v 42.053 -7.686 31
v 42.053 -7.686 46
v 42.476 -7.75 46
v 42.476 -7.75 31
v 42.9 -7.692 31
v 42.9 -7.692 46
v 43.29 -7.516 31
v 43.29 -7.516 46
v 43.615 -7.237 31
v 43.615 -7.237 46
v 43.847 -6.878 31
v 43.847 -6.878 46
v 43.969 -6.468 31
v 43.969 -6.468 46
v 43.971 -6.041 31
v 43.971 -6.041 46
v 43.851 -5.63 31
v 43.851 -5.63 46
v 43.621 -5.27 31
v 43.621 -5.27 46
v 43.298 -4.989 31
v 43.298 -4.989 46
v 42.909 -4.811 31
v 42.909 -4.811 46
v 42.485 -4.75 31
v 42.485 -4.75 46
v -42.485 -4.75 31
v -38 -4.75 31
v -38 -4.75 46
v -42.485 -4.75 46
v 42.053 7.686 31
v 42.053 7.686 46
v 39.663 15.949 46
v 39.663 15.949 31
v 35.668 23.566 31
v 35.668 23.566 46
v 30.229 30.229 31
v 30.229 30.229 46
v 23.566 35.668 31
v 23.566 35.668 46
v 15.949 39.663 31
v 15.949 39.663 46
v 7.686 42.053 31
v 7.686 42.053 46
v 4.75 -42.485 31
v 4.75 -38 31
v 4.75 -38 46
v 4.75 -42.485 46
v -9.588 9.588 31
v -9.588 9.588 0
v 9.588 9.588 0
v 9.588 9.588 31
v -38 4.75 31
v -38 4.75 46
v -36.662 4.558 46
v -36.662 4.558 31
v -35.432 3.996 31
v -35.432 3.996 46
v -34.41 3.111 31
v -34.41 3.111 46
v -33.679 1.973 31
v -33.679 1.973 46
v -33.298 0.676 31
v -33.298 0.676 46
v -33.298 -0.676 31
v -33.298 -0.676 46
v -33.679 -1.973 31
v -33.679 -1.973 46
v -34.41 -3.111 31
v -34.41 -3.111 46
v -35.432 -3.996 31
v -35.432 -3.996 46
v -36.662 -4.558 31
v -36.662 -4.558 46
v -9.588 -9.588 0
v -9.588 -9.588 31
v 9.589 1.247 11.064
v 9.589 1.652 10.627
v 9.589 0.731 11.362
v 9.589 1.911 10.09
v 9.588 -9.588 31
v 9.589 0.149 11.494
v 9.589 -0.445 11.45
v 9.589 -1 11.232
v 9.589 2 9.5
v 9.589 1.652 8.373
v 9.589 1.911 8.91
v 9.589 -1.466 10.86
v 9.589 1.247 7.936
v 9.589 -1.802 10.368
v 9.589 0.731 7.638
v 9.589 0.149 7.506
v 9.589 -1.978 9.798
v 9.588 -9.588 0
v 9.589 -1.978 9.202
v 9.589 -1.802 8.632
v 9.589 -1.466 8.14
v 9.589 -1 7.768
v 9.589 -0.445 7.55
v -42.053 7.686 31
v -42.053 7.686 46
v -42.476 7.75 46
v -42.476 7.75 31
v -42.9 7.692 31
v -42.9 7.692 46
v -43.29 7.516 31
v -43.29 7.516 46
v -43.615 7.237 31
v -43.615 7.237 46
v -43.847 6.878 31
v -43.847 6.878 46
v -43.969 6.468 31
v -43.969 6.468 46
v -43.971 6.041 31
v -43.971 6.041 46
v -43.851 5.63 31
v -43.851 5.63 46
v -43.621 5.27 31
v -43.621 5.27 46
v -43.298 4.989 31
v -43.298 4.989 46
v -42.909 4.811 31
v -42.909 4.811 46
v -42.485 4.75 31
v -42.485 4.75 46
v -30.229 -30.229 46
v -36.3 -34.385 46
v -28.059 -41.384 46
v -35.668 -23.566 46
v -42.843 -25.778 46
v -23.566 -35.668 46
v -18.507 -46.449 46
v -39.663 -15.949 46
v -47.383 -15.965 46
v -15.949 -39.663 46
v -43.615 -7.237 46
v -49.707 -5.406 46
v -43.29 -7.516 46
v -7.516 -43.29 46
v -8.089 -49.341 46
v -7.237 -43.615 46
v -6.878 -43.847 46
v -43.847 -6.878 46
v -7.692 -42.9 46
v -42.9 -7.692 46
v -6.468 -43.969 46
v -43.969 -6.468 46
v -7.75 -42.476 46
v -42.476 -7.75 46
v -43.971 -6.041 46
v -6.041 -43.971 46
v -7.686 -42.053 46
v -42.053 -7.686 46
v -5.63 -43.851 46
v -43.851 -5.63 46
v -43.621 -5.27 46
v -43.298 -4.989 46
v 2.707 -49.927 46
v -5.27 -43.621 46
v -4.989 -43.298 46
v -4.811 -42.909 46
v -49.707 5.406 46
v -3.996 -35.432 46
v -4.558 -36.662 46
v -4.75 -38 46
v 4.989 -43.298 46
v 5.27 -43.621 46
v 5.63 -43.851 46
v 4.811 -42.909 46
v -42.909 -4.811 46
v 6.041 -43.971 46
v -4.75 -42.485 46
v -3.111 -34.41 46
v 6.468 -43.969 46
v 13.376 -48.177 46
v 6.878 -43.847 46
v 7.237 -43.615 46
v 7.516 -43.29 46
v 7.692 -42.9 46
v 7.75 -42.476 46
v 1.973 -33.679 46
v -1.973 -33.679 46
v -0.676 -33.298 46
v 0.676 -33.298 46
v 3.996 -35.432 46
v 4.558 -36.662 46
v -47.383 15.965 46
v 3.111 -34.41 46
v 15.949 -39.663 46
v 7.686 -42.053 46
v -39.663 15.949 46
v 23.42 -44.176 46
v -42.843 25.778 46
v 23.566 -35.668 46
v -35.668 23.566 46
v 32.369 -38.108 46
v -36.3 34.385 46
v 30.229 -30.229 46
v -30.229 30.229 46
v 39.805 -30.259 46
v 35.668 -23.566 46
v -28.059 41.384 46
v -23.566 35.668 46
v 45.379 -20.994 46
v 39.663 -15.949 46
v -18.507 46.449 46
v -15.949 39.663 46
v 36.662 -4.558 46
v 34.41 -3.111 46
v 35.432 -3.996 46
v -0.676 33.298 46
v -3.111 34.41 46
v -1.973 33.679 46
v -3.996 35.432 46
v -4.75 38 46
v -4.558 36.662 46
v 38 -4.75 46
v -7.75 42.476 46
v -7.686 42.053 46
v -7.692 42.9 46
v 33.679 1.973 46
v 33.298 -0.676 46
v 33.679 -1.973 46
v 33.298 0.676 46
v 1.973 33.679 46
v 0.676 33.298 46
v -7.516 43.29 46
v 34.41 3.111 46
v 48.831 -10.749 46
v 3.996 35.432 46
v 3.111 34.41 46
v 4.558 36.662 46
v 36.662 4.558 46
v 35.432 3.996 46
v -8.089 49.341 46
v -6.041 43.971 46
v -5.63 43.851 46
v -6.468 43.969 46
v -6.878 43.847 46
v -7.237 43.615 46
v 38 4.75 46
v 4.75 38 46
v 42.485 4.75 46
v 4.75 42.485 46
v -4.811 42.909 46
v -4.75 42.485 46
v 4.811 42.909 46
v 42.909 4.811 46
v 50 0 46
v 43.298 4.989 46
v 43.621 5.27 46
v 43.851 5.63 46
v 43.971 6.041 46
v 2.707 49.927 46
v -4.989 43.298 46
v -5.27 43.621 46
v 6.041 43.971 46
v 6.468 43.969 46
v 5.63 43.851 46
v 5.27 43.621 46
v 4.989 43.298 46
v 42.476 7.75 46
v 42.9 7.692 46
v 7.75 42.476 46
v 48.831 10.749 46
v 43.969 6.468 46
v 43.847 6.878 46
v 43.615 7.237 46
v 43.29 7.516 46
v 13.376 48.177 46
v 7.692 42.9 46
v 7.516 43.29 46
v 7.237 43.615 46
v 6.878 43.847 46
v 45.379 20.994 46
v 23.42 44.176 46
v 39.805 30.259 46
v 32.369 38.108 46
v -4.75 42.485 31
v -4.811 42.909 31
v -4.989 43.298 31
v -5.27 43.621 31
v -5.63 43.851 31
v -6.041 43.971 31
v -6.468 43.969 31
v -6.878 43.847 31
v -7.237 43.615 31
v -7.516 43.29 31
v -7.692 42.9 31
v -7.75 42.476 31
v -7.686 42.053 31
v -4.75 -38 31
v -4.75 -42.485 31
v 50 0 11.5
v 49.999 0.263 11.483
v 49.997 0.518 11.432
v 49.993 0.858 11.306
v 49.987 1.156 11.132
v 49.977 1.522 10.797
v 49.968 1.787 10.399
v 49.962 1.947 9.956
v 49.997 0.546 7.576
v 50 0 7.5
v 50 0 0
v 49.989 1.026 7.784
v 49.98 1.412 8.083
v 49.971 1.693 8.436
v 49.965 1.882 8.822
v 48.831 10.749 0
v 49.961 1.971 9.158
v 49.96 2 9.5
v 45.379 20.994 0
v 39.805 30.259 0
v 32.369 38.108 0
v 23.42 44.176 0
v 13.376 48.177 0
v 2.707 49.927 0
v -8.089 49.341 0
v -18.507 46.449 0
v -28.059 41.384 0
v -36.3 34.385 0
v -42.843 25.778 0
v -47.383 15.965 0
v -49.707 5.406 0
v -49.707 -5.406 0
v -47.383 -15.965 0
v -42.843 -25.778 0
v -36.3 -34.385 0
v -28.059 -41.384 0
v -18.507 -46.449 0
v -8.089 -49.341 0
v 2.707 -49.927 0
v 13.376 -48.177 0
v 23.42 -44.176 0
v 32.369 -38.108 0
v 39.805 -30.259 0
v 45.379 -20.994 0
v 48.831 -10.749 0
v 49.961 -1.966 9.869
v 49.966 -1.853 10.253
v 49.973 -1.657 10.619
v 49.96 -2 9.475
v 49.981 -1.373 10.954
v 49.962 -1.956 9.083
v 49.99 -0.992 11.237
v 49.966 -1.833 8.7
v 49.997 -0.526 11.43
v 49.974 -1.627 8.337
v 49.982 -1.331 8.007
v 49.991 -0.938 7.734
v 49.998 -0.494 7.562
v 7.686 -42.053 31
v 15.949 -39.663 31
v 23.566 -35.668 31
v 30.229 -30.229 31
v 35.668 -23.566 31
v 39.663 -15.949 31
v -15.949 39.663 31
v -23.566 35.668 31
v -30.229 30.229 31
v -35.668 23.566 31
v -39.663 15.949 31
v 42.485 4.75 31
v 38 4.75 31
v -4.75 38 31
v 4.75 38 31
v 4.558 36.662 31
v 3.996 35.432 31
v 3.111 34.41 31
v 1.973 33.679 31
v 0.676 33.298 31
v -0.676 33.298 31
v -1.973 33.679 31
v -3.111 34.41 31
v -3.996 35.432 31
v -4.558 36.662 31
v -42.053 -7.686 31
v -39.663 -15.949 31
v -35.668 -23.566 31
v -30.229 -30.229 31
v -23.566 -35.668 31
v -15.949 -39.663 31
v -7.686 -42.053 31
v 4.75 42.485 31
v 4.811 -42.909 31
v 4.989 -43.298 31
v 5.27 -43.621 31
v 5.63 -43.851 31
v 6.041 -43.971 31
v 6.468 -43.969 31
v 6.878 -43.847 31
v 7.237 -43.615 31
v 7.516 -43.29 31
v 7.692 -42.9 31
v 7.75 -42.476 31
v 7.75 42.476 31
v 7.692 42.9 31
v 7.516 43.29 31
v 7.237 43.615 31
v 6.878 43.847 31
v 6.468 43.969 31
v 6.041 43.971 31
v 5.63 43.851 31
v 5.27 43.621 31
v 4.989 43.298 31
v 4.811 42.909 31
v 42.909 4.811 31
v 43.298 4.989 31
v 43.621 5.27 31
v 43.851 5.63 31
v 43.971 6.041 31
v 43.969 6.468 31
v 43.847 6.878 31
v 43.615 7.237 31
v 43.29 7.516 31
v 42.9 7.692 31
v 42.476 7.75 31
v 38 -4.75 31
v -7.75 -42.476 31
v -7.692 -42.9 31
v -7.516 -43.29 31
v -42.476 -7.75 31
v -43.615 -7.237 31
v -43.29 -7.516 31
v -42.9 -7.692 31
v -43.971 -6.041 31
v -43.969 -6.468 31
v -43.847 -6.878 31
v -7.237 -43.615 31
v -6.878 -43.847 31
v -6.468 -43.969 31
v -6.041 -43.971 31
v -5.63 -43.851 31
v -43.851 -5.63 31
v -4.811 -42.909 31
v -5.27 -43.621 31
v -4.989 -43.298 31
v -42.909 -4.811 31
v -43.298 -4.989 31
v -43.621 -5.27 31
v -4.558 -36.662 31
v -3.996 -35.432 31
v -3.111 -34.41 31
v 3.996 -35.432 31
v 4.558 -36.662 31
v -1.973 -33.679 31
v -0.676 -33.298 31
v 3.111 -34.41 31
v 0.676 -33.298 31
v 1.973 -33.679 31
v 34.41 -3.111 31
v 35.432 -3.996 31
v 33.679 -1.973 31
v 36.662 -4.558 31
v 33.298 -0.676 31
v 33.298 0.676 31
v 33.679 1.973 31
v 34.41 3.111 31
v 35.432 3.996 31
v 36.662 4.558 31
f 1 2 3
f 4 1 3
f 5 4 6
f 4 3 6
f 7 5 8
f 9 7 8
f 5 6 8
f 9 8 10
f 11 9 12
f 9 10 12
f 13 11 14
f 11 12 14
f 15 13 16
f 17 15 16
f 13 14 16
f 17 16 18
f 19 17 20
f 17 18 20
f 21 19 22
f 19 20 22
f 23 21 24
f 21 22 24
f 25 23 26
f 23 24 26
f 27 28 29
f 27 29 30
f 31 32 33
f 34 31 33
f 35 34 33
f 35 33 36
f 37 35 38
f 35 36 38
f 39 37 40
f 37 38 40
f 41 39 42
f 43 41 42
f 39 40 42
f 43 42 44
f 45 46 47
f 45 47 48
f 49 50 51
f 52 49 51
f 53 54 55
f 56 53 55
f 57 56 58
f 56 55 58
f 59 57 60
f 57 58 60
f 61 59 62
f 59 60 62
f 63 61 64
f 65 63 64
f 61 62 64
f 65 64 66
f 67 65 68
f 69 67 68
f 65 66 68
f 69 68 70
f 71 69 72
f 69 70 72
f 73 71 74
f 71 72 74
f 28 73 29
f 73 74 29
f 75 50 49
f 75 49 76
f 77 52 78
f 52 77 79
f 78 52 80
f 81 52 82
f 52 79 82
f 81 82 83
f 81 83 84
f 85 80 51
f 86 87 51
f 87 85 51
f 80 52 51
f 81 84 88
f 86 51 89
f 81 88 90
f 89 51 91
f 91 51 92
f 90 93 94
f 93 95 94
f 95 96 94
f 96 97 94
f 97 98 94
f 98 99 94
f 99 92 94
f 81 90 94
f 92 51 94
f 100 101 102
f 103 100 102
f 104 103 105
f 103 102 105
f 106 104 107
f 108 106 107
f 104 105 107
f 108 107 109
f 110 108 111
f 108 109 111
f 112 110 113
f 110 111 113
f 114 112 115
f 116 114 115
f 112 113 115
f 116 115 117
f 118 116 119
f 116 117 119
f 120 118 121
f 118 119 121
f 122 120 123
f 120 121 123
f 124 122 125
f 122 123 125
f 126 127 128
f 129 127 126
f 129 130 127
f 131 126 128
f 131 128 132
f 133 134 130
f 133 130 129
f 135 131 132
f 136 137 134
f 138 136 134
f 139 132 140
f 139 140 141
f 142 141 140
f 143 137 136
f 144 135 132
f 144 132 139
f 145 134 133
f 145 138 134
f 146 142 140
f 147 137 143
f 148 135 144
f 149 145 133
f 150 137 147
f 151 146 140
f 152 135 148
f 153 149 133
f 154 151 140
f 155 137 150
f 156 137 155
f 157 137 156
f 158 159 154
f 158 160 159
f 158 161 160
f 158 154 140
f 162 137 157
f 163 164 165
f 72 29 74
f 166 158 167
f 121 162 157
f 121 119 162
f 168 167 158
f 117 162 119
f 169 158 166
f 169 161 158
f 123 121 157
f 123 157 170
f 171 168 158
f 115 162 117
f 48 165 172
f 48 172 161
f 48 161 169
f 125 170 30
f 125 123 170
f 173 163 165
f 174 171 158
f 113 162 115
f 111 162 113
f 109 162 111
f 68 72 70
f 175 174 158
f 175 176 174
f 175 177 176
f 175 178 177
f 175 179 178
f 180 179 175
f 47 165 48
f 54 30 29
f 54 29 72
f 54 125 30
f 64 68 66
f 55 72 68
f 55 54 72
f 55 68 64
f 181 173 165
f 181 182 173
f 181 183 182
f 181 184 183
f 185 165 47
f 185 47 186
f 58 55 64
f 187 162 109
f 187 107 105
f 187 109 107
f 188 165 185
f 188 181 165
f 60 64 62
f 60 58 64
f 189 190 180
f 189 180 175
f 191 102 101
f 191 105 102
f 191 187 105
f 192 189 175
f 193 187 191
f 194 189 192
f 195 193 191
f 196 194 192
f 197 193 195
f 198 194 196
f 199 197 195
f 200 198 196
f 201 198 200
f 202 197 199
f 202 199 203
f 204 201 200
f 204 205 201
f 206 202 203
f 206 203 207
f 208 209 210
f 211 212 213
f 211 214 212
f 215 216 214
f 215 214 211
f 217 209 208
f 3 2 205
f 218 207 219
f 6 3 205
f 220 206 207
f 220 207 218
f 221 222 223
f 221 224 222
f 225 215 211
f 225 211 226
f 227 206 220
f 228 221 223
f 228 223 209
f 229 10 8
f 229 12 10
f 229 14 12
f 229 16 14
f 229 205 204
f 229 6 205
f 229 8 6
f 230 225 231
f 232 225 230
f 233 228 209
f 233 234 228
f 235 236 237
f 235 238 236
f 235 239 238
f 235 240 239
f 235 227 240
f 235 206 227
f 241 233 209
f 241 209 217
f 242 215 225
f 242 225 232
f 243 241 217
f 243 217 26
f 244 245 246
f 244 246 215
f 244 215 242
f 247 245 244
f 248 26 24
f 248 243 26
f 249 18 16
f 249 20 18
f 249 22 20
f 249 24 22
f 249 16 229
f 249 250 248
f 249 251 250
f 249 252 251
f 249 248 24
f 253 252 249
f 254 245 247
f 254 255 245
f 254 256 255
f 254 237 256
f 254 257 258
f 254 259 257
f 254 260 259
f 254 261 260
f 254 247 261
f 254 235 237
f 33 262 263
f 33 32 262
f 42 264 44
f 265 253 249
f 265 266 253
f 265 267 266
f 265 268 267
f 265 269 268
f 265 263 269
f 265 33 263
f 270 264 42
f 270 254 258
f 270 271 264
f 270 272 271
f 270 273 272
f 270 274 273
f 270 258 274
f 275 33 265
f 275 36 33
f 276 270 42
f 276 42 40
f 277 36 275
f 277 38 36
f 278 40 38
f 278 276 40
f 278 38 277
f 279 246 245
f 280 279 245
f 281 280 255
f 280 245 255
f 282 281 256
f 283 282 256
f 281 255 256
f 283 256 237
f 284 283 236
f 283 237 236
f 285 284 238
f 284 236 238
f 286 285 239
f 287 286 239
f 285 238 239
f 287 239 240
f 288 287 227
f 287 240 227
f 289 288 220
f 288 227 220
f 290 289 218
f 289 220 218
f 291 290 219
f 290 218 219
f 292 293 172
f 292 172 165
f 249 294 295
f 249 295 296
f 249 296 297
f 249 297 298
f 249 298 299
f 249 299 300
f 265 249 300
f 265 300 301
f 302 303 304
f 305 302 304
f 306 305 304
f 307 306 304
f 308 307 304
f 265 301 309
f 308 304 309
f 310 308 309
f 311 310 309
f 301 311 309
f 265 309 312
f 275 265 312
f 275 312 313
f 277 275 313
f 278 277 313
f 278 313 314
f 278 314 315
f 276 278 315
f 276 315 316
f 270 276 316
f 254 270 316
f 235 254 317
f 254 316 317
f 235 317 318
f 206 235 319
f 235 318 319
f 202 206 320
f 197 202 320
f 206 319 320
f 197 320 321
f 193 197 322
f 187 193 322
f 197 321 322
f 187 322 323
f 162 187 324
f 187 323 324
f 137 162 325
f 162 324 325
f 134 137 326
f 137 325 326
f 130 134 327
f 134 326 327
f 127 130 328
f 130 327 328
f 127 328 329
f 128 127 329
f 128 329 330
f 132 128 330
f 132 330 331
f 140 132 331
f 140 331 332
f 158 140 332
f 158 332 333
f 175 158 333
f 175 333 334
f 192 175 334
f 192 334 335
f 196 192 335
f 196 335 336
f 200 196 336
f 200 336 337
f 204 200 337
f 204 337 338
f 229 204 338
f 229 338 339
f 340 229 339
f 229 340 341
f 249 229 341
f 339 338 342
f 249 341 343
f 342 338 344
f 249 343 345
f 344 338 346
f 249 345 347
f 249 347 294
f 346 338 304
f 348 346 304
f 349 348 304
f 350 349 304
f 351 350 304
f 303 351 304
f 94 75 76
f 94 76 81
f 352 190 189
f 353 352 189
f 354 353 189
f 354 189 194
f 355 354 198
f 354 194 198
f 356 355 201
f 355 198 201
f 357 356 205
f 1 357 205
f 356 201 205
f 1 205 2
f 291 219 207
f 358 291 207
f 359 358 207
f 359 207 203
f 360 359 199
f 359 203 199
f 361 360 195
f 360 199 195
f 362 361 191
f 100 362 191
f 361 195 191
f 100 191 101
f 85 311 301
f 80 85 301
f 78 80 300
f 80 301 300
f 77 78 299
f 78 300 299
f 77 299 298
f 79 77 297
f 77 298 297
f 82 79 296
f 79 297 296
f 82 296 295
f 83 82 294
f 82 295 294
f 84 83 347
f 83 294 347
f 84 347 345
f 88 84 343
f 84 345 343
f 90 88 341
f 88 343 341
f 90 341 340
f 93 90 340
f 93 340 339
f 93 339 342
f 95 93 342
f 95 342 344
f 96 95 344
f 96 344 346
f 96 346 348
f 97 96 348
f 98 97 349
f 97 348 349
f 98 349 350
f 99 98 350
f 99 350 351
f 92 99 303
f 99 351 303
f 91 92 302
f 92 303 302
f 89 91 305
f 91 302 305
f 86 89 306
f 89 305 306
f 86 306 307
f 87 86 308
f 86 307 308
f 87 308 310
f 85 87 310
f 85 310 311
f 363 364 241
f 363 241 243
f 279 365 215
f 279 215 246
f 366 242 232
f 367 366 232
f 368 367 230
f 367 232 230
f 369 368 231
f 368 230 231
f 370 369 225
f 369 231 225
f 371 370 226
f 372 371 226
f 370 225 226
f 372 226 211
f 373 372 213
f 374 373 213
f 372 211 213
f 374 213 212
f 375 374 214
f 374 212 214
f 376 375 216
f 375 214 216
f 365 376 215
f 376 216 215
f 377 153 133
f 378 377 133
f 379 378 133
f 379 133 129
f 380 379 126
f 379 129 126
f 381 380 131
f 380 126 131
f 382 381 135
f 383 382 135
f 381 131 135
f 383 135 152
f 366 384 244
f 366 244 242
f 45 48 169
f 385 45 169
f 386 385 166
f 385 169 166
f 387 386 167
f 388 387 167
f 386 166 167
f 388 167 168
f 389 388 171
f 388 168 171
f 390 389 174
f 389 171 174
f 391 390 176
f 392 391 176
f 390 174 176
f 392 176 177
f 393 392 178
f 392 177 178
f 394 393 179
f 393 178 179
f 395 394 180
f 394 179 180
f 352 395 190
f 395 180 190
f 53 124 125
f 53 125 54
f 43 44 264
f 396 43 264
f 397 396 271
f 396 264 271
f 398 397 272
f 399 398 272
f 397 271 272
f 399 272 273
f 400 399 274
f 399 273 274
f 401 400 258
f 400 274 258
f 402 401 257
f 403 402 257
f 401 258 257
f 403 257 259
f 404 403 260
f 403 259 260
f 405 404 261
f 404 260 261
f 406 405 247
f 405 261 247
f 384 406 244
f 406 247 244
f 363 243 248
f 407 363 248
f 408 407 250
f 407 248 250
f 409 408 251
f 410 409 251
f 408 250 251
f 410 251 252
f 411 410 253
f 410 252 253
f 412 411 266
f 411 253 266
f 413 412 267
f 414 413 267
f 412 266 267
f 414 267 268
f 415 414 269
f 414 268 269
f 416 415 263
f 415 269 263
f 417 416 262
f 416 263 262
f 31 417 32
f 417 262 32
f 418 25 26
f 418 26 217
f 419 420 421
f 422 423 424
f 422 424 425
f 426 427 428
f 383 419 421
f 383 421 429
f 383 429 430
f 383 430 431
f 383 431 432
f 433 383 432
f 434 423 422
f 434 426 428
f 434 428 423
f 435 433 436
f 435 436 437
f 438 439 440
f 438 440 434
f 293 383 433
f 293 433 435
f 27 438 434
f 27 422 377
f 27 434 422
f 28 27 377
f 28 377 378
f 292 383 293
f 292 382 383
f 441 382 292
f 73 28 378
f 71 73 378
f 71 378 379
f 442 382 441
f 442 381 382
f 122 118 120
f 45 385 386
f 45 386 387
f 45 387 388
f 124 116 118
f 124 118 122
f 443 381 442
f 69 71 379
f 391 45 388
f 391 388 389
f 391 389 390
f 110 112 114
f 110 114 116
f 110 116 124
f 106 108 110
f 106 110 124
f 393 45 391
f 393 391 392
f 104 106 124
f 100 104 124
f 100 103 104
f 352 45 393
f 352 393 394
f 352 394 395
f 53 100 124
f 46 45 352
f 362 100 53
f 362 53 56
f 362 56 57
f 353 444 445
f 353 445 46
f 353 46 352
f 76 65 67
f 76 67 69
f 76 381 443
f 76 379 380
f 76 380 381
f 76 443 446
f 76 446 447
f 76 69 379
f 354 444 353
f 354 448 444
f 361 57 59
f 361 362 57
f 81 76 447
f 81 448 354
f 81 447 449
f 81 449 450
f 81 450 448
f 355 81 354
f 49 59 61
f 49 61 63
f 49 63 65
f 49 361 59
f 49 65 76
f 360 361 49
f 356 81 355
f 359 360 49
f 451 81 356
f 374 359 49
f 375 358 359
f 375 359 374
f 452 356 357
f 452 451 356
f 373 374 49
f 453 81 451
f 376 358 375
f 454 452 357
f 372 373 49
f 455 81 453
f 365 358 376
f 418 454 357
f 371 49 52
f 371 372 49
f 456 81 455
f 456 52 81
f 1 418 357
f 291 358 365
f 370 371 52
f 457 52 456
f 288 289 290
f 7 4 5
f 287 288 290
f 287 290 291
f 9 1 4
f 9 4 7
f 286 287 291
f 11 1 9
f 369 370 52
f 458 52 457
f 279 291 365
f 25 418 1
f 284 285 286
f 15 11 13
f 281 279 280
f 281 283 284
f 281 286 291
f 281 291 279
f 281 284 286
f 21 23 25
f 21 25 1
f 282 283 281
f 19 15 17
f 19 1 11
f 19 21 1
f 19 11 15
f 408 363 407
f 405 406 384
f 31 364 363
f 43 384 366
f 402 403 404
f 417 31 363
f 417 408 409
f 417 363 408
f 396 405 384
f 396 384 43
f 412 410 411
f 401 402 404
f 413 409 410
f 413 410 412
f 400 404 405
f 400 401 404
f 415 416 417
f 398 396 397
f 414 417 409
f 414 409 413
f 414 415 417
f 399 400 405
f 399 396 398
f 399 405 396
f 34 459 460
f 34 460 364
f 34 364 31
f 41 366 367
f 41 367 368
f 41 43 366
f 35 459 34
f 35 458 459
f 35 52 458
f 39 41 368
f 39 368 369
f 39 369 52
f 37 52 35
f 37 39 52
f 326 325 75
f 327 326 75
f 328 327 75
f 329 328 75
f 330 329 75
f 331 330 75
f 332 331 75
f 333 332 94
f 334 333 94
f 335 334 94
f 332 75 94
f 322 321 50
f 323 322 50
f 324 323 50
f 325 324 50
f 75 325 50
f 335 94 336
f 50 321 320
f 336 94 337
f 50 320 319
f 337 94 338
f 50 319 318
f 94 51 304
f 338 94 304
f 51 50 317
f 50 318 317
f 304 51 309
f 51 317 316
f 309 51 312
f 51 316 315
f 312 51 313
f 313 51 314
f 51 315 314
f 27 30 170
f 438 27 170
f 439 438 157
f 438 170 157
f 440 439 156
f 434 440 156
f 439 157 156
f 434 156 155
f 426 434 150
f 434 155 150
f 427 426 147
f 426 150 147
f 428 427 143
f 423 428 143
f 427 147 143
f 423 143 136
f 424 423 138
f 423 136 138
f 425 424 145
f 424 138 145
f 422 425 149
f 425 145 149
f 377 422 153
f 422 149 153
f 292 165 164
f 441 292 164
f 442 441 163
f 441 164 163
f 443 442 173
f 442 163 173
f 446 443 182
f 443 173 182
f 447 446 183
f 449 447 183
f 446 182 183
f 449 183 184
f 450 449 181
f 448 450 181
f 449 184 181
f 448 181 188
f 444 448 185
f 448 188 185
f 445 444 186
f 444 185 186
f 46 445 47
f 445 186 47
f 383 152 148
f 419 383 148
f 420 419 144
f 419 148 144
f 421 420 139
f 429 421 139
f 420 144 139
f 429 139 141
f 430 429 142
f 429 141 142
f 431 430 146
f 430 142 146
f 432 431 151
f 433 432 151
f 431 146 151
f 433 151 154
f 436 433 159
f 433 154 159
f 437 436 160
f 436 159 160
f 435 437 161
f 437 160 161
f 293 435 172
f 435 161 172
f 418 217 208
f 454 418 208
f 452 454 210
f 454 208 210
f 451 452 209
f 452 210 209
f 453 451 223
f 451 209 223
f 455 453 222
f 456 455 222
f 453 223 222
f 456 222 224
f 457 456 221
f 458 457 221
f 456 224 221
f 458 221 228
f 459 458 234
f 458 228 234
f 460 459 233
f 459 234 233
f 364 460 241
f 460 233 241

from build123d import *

# Parameters (mm, degrees)
F0_R     = 50
F1_DEPTH = 46
F3_DEPTH = 15
F4_W     = 19.177
F4_H     = 19.177
F5_DEPTH = 46.001
F7_R     = 2
F8_DEPTH = 40.4115


with BuildPart() as f1:
    # F0 (on Top) → F1 (new body)
    with BuildSketch(Plane.XY):
        Circle(F0_R)
    extrude(amount=F1_DEPTH)

    # F2 (on face) → F3 (cut)
    with BuildSketch(Plane.XY.offset(46)):
        with BuildLine():
            ThreePointArc((-4.75, 42.485292), (-6.468315, 43.969319), (-7.686451, 42.053311))
            ThreePointArc((-7.686451, 42.053311), (-30.228815, 30.228815), (-42.053311, 7.686451))
            ThreePointArc((-42.053311, 7.686451), (-43.969319, 6.468315), (-42.485292, 4.75))
            Line((-42.485292, 4.75), (-38, 4.75))
            ThreePointArc((-38, 4.75), (-33.25, 0), (-38, -4.75))
            Line((-38, -4.75), (-42.485292, -4.75))
            ThreePointArc((-42.485292, -4.75), (-43.969319, -6.468315), (-42.053311, -7.686451))
            ThreePointArc((-42.053311, -7.686451), (-30.228815, -30.228815), (-7.686451, -42.053311))
            ThreePointArc((-7.686451, -42.053311), (-6.468315, -43.969319), (-4.75, -42.485292))
            Line((-4.75, -42.485292), (-4.75, -38))
            ThreePointArc((-4.75, -38), (0, -33.25), (4.75, -38))
            Line((4.75, -38), (4.75, -42.485292))
            ThreePointArc((4.75, -42.485292), (6.468315, -43.969319), (7.686451, -42.053311))
            ThreePointArc((7.686451, -42.053311), (30.228815, -30.228815), (42.053311, -7.686451))
            ThreePointArc((42.053311, -7.686451), (43.969319, -6.468315), (42.485292, -4.75))
            Line((42.485292, -4.75), (38, -4.75))
            ThreePointArc((38, -4.75), (33.25, 0), (38, 4.75))
            Line((38, 4.75), (42.485292, 4.75))
            ThreePointArc((42.485292, 4.75), (43.969319, 6.468315), (42.053311, 7.686451))
            ThreePointArc((42.053311, 7.686451), (30.228815, 30.228815), (7.686451, 42.053311))
            ThreePointArc((7.686451, 42.053311), (6.468315, 43.969319), (4.75, 42.485292))
            Line((4.75, 42.485292), (4.75, 38))
            ThreePointArc((4.75, 38), (0, 33.25), (-4.75, 38))
            Line((-4.75, 38), (-4.75, 42.485292))
        make_face()
    extrude(amount=-F3_DEPTH, mode=Mode.SUBTRACT)

    # F4 (on face) → F5 (cut, through all)
    with BuildSketch(Plane(origin=(0, 0, 0), x_dir=(1, 0, 0), z_dir=(0, 0, -1))):
        Rectangle(F4_W, F4_H)
    extrude(amount=-F5_DEPTH, mode=Mode.SUBTRACT)

    # F7 (on offset) → F8 (cut, through all)
    with BuildSketch(Plane.YZ.offset(50)):
        with Locations((0, 9.5)):
            Circle(F7_R)
    extrude(amount=-F8_DEPTH, mode=Mode.SUBTRACT)


solid = f1.part
